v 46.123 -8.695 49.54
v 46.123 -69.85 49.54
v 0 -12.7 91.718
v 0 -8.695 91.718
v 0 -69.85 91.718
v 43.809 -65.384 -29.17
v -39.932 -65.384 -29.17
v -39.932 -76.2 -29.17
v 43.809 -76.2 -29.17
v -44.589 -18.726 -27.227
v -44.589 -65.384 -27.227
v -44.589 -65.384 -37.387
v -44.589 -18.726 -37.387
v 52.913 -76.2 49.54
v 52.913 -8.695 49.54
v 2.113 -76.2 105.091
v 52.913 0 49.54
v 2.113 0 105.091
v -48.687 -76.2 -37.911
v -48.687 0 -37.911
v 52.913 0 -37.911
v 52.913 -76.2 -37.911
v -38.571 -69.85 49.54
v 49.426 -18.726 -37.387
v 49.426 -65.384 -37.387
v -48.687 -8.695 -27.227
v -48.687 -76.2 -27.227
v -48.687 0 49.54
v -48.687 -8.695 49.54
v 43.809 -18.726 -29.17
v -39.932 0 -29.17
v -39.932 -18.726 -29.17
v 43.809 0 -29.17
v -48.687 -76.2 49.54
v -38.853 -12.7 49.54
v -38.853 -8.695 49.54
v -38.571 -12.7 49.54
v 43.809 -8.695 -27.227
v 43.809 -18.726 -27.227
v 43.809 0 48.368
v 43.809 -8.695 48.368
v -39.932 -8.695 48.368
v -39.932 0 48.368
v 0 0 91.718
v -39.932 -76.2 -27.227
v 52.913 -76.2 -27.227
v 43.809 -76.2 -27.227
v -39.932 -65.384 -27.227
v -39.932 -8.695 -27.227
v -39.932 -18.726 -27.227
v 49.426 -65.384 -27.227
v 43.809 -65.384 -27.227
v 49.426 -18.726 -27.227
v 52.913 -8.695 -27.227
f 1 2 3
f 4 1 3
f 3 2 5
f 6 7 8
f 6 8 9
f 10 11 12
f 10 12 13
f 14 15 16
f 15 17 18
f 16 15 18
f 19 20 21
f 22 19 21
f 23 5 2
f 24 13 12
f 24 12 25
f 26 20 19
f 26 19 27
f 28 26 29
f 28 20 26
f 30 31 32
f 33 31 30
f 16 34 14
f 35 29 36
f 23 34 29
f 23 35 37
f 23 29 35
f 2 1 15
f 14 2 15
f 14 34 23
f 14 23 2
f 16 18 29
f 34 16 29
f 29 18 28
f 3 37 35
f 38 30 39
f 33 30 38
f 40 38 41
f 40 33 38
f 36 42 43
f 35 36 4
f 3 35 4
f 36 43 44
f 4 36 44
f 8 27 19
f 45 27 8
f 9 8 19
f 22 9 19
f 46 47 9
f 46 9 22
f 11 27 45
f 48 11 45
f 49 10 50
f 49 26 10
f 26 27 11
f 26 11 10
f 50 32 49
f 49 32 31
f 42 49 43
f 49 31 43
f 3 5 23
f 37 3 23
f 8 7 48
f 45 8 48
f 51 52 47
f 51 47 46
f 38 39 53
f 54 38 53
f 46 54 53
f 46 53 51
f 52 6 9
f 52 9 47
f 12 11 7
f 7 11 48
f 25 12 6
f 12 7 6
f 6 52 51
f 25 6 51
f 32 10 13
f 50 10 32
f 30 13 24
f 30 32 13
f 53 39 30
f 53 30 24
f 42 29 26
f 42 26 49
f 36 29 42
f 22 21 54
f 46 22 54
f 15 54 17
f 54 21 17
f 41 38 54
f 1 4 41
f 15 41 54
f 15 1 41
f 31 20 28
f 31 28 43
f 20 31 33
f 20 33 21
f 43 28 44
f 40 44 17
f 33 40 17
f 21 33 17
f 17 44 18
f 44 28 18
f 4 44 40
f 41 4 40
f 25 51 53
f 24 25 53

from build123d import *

# Parameters (mm, degrees)
F0_W      = 101.6
F0_H      = 10.6841248744
F1_DEPTH  = 76.2
F2_W      = 101.6
F2_H      = 10.6841248744
F2_H_2    = 76.766988388
F3_DEPTH  = 8.6953
F5_DEPTH  = 76.2
F6_W      = 94.0149463713
F6_H      = 46.6581489891
F7_DEPTH  = 10.16
F9_DEPTH  = 67.5047
F11_DEPTH = 6.35
F12_W     = 83.7408676744
F12_H     = 77.5378420949
F13_DEPTH = 76.201
F15_DEPTH = 12.7


with BuildPart() as f1:
    # F0 (on Front) → F1 (new body)
    with BuildSketch(Plane.XZ):
        with Locations((2.113474533, -32.5691830367)):
            Rectangle(F0_W, F0_H)
    extrude(amount=F1_DEPTH)

    # F2 (on Front) → F3 (join)
    with BuildSketch(Plane.XZ):
        with Locations((2.113474533, -32.5691830367)):
            Rectangle(F2_W, F2_H)
        with Locations((2.113474533, 11.1563735945)):
            Rectangle(F2_W, F2_H_2)
    extrude(amount=F3_DEPTH)

    # F4 (on Front) → F5 (join)
    with BuildSketch(Plane.XZ):
        Polygon((2.113474533, 105.0908565521), (-48.686525467, 49.5398677886), (52.913474533, 49.5398677886), align=None)
    extrude(amount=F5_DEPTH)

    # F6 (on face) → F7 (cut)
    with BuildSketch(Plane.XY.offset(-27.2271205995)):
        with Locations((2.4187173694, -42.054575868)):
            Rectangle(F6_W, F6_H)
    extrude(amount=-F7_DEPTH, mode=Mode.SUBTRACT)

    # F8 (on face) → F9 (cut, through all)
    with BuildSketch(Plane.XZ.offset(76.2)):
        Polygon((0, 91.7181875073), (-38.5710261762, 49.5398677886), (46.1229796213, 49.5398677886), align=None)
    extrude(amount=-F9_DEPTH, mode=Mode.SUBTRACT)

    # F10 (on face) → F11 (join)
    with BuildSketch(Plane.XZ.offset(76.2)):
        Polygon((0, 91.7181875073), (-38.5710261762, 49.5398677886), (46.1229796213, 49.5398677886), align=None)
    extrude(amount=-F11_DEPTH)

    # F12 (on Front) → F13 (cut, through all)
    with BuildSketch(Plane.XZ):
        with Locations((1.9384473562, 9.5993131399)):
            Rectangle(F12_W, F12_H)
    extrude(amount=F13_DEPTH, mode=Mode.SUBTRACT)

    # F14 (on face) → F15 (cut)
    with BuildSketch(Plane(origin=(0, 0, 0), x_dir=(-1, 0, 0), z_dir=(0, 1, 0))):
        Polygon((0, 91.7181875073), (-43.8088811934, 48.3682341874), (39.931986481, 48.3682341874), align=None)
    extrude(amount=-F15_DEPTH, mode=Mode.SUBTRACT)


solid = f1.part
